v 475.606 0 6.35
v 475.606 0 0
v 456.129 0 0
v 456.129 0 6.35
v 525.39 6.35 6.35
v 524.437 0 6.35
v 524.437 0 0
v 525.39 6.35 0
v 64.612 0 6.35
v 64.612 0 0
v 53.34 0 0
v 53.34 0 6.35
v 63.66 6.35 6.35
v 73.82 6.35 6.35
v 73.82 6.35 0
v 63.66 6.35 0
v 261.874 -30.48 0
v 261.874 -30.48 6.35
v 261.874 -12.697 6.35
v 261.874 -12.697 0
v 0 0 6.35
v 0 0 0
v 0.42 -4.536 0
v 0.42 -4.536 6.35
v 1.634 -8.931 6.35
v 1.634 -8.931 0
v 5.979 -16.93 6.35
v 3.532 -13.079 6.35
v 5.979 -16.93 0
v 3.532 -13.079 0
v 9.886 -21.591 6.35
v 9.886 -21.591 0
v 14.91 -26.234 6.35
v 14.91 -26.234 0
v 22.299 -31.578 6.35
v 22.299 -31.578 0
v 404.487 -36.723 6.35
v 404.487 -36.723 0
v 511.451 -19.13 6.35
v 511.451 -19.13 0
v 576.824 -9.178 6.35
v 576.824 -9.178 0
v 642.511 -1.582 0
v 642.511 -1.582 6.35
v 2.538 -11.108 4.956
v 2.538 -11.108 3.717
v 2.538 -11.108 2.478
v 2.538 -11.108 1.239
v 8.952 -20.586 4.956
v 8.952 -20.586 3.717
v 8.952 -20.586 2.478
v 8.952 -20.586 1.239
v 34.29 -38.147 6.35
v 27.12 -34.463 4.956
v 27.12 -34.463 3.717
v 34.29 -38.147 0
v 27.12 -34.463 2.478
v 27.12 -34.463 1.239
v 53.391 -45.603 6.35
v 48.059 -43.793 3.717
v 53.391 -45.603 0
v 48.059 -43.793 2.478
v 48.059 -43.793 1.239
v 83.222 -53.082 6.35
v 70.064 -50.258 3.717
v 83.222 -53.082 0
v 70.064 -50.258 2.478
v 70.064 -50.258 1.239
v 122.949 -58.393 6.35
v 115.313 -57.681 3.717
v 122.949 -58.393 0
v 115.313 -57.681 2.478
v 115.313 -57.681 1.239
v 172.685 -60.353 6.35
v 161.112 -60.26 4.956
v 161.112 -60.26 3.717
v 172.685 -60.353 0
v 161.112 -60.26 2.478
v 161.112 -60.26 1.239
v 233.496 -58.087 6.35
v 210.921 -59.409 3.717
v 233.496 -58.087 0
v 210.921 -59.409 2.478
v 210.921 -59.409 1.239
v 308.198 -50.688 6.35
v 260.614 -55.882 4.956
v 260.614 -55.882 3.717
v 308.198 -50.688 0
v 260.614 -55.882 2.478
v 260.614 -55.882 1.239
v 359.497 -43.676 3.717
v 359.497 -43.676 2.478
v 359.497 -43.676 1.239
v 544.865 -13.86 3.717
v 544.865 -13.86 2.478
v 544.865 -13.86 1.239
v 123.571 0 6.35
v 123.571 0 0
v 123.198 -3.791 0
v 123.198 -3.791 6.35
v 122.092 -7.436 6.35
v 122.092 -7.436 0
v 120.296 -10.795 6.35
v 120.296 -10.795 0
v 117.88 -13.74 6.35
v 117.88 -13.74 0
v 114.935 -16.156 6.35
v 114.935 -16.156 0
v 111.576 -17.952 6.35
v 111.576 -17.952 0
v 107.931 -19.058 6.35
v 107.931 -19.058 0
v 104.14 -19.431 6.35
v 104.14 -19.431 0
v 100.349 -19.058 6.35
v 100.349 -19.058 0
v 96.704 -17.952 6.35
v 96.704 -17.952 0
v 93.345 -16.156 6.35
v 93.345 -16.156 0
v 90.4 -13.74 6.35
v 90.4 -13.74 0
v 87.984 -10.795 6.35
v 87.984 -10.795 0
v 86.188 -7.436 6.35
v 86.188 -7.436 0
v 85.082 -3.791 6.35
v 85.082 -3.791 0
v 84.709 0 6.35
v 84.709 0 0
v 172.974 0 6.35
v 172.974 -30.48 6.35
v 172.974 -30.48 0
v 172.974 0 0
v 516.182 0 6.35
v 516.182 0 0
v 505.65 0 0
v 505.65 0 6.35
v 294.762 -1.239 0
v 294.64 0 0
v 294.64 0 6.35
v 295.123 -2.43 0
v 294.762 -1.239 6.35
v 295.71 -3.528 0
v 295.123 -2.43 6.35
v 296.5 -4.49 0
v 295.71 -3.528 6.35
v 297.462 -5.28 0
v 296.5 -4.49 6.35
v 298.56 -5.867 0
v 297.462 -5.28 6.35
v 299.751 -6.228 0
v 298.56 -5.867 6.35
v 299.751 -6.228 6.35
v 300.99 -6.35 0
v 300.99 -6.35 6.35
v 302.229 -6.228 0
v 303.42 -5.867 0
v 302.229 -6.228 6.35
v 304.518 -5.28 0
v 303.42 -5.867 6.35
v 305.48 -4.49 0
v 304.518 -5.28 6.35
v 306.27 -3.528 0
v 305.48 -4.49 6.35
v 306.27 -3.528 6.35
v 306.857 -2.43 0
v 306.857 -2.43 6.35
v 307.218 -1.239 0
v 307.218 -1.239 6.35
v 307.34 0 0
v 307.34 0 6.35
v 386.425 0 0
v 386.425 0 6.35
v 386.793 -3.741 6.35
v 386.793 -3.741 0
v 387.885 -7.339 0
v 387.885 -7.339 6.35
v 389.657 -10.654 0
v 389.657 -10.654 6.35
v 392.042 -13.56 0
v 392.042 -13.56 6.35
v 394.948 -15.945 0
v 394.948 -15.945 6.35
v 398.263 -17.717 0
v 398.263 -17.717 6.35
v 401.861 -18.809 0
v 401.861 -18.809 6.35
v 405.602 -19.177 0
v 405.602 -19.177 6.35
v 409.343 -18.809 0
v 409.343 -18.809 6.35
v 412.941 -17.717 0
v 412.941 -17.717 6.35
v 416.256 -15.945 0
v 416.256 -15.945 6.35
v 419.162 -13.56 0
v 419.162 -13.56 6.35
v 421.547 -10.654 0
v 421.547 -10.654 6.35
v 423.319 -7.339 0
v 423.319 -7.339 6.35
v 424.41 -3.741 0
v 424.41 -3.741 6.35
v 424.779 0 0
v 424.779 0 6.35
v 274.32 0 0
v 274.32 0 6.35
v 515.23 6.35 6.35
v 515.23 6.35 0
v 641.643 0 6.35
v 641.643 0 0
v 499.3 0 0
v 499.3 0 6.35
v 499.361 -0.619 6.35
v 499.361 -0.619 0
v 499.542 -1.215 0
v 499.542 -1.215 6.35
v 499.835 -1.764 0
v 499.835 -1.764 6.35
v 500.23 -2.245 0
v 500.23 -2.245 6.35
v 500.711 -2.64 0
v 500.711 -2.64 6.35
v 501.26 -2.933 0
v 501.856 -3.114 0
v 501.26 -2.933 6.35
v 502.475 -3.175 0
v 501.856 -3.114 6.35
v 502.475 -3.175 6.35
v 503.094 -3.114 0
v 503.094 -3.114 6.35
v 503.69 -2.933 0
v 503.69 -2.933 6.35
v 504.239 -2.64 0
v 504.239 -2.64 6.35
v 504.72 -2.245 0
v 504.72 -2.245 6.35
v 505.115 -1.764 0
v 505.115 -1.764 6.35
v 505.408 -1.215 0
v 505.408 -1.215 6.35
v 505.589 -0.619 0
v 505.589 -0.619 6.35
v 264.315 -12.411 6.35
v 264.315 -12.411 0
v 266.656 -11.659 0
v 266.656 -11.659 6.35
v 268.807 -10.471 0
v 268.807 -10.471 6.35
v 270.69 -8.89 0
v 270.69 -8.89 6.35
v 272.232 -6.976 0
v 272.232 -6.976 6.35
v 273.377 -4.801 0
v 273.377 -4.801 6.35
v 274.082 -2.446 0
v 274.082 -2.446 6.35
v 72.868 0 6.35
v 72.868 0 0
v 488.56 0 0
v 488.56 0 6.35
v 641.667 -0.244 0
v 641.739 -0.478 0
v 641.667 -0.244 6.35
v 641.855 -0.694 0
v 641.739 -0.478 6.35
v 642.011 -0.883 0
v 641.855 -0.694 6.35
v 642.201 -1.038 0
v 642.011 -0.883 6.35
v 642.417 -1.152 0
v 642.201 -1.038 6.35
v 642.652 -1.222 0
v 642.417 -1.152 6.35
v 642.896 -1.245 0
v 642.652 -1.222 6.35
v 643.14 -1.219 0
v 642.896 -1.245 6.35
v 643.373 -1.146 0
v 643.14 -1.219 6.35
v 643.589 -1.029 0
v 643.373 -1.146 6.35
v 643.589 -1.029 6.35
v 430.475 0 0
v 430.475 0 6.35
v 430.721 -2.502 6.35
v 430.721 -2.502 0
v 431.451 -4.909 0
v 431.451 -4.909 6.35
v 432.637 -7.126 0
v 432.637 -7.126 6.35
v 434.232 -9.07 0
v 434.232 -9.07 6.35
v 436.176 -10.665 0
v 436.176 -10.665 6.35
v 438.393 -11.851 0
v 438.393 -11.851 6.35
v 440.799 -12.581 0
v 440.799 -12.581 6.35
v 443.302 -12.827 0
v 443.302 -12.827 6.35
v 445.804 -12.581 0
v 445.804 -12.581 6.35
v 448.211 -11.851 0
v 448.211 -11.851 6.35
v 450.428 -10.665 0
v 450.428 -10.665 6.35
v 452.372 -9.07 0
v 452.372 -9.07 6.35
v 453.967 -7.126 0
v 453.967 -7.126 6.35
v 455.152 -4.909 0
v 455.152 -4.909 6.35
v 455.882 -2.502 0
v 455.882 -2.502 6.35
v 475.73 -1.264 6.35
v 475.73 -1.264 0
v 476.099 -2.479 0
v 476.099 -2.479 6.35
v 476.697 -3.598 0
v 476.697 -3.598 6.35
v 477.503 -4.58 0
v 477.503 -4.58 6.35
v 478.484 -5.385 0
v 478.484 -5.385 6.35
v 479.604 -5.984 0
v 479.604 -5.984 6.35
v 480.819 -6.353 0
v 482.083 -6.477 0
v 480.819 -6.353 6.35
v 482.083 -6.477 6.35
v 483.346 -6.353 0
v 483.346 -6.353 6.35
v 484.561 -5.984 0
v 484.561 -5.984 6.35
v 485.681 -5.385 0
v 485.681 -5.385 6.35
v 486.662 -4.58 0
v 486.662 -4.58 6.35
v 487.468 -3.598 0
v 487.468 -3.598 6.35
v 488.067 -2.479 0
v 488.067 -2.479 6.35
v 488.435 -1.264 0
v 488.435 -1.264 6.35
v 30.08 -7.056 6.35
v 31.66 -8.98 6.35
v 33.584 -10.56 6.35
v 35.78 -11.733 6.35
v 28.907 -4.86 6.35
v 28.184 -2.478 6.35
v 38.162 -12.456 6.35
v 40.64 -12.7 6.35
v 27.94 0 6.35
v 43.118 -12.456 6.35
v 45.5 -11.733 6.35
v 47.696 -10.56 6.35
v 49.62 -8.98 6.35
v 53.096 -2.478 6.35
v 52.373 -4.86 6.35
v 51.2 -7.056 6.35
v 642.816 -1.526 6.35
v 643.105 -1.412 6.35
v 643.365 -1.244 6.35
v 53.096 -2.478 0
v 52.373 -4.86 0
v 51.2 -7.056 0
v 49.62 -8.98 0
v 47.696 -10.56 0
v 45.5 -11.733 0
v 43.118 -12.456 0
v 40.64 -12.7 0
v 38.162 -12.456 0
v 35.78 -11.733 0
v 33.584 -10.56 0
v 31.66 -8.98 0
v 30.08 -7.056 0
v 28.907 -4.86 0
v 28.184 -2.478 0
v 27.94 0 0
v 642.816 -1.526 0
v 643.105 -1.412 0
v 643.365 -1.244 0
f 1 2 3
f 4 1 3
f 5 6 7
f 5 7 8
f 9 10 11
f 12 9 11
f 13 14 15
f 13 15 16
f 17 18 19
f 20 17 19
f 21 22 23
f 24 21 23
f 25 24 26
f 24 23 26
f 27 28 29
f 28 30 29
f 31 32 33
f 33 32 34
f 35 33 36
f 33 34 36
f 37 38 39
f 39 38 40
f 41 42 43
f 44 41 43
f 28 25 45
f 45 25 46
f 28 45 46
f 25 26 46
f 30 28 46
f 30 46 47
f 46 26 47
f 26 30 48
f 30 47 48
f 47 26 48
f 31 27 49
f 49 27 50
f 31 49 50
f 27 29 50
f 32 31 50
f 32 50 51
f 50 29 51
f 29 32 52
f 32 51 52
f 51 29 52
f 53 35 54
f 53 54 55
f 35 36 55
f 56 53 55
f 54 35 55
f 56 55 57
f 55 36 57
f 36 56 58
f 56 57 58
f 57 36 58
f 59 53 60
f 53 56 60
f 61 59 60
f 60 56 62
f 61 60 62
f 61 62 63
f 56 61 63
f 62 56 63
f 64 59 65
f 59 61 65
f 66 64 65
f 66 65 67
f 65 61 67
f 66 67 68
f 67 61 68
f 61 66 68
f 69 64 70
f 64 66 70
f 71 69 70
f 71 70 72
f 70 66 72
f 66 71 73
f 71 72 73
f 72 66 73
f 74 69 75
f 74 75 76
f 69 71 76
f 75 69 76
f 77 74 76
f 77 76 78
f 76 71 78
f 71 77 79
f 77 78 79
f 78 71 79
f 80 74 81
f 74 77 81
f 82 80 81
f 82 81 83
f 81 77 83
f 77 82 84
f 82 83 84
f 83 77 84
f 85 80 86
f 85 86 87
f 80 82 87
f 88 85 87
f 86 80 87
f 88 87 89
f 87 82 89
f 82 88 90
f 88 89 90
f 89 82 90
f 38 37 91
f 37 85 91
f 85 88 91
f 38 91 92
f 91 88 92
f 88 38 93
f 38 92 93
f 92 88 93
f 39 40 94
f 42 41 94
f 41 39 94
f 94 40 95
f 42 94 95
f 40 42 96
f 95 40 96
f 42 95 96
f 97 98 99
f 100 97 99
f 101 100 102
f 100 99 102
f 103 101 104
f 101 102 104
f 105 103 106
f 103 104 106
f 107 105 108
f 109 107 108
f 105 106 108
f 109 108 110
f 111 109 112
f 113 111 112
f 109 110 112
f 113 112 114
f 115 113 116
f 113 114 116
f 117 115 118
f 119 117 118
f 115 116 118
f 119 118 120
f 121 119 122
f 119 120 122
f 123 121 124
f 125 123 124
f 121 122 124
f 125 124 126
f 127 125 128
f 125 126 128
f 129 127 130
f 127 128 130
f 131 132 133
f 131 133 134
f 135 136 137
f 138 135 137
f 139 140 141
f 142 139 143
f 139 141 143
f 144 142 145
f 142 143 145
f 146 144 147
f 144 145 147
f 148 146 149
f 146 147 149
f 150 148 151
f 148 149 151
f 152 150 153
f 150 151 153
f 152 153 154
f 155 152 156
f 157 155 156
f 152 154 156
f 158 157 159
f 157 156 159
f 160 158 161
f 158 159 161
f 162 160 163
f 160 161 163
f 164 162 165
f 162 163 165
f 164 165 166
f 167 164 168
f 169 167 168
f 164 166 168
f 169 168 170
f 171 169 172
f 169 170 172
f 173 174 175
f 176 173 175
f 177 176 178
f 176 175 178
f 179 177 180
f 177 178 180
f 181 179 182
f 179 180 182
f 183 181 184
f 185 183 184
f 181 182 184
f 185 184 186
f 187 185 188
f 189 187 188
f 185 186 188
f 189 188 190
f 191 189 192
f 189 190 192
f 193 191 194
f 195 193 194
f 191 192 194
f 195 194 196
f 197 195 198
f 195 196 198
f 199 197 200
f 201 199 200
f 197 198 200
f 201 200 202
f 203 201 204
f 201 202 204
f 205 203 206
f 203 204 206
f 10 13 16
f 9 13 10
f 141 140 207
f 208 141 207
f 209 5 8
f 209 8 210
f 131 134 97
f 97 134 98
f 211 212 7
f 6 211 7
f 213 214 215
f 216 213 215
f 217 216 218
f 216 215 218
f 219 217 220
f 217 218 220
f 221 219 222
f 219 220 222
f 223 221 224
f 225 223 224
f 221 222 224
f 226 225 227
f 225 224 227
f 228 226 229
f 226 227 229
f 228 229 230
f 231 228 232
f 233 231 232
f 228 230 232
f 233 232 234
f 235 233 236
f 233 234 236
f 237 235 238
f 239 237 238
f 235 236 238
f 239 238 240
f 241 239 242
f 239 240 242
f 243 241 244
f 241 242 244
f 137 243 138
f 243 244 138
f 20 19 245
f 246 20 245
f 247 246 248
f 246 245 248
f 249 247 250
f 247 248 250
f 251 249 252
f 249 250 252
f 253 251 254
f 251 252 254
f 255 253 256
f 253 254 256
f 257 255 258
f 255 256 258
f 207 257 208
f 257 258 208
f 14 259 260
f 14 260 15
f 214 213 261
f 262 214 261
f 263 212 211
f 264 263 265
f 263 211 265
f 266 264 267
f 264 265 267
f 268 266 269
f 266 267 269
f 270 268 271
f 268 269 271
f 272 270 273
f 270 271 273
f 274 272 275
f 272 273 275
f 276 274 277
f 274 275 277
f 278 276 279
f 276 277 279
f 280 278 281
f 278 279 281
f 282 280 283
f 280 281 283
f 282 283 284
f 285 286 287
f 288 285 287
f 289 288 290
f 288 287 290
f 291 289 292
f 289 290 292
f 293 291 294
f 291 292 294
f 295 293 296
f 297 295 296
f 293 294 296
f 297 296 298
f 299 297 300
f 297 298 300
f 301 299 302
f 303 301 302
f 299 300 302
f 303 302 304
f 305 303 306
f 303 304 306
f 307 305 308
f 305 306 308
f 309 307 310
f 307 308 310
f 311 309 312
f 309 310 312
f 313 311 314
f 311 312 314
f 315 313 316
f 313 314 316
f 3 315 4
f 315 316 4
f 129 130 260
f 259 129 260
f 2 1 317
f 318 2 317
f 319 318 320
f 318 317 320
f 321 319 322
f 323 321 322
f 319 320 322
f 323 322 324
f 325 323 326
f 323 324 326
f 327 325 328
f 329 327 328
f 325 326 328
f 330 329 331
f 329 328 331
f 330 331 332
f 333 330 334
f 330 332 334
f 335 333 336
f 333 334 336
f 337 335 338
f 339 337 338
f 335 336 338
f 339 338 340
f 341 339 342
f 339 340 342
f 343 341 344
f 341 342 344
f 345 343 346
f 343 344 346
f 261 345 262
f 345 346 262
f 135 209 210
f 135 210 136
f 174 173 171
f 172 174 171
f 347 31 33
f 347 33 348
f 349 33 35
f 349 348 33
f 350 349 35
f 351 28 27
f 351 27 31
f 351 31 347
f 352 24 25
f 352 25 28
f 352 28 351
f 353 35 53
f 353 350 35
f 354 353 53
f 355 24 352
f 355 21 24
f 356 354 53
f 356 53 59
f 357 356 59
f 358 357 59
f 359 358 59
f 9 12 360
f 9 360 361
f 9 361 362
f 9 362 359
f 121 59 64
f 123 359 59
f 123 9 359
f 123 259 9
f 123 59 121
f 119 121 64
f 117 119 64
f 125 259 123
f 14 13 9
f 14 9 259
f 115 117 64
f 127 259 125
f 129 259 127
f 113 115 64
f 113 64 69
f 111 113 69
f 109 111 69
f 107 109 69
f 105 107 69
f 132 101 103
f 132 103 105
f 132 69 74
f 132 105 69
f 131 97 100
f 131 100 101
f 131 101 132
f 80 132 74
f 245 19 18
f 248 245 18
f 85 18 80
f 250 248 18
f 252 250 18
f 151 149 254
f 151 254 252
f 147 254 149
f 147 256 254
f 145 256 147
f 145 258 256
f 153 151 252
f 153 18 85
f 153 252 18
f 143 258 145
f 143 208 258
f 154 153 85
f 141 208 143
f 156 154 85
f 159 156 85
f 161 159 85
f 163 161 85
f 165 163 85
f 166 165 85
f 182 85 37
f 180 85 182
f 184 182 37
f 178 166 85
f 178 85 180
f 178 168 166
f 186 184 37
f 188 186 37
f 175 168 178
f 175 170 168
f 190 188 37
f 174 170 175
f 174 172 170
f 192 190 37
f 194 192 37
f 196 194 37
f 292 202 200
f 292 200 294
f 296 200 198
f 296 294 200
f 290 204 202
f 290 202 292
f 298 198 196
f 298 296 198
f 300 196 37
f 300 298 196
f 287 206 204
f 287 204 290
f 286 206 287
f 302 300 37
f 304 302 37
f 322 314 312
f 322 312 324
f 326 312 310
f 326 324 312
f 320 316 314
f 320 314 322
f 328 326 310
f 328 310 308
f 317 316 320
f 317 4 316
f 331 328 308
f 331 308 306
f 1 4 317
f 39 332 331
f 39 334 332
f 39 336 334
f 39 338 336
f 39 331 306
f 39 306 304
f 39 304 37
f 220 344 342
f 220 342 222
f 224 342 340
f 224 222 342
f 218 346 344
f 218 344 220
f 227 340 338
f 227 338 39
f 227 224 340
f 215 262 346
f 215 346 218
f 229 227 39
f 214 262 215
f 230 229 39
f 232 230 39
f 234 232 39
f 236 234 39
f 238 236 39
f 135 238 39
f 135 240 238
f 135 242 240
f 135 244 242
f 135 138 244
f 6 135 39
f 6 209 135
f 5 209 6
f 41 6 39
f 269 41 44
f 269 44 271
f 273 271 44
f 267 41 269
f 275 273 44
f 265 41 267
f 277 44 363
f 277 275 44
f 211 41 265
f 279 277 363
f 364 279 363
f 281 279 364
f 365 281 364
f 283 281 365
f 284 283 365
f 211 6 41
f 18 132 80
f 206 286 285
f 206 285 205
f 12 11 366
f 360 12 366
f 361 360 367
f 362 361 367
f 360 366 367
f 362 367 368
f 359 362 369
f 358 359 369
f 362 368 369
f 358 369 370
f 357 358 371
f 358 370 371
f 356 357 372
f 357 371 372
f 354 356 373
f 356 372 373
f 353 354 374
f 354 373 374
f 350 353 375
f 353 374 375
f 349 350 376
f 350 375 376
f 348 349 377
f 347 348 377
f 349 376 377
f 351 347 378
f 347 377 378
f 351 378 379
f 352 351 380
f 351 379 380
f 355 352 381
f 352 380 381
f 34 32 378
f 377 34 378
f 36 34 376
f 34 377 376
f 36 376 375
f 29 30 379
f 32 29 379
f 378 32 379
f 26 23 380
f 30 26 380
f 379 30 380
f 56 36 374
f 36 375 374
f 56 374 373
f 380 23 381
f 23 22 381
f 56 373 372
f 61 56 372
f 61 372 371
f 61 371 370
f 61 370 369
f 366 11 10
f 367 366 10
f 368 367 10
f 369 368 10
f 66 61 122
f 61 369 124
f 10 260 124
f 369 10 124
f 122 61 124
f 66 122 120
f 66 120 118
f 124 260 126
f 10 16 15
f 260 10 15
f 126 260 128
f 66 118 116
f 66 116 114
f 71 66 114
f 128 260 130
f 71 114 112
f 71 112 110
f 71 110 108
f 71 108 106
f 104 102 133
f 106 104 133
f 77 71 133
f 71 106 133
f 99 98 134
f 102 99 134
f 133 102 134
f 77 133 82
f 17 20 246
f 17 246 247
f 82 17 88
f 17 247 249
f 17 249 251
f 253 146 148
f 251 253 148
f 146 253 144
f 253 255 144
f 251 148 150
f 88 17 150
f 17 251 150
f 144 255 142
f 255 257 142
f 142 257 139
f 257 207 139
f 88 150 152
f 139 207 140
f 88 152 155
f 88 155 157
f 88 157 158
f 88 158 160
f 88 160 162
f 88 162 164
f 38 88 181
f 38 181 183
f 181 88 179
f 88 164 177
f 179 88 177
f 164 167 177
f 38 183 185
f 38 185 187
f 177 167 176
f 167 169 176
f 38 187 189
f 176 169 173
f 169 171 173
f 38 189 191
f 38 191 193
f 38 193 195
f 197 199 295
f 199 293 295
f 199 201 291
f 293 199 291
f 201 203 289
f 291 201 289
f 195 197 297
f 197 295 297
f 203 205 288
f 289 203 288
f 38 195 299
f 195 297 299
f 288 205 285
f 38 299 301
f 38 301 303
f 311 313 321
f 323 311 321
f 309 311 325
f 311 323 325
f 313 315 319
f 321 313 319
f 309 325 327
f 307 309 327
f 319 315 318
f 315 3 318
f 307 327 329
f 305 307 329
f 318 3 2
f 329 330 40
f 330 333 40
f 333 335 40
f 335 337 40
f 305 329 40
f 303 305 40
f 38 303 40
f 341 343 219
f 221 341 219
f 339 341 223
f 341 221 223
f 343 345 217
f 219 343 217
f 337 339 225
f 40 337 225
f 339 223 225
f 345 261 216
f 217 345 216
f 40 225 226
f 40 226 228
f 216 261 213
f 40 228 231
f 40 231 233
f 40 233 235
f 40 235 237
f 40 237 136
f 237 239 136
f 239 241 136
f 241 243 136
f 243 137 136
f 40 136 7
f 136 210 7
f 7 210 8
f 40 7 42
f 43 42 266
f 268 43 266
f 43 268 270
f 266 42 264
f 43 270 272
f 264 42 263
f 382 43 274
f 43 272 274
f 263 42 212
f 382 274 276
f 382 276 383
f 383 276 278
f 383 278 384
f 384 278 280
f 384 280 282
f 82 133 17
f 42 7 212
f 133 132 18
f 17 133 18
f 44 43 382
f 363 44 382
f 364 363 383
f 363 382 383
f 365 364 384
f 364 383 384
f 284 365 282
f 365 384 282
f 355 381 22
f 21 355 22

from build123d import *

# Parameters (mm, degrees)
BOSS_EXTRUDE1_DEPTH     = 6.35
CUT_EXTRUDE2_DEPTH      = 1.0000001
CUT_EXTRUDE2_DEPTH_BACK = 7.3500001
SKETCH4_W               = 6.35
SKETCH4_H               = 6.35
BOSS_EXTRUDE2_DEPTH     = 6.35
SKETCH7_W               = 88.9
SKETCH7_H               = 60.96
CUT_EXTRUDE4_DEPTH      = 7.3500001
SKETCH8_R               = 1.2446
CUT_EXTRUDE5_DEPTH      = 7.3500001


with BuildPart() as part:
    # Sketch2 → Boss-Extrude1 (new body)
    with BuildSketch(Plane.XY):
        with BuildLine():
            Line((460.660965279, 0), (123.571, 0))
            ThreePointArc((123.571, 0), (104.14, -19.431), (84.709, 0))
            Line((84.709, 0), (53.34, 0))
            ThreePointArc((53.34, 0), (40.64, -12.7), (27.94, 0))
            Line((27.94, 0), (0, 0))
            add(Edge.make_bspline(
                [(0, 0), (0, -1.007496172), (0.154611582, -3.513796615), (1.106333228, -7.923389435), (3.463136343, -13.420354421), (7.689616489, -19.513207632), (13.932423524, -25.726412106), (22.129107375, -31.731455339), (32.141645239, -37.332204029), (43.82045433, -42.41500246), (57.023709725, -46.912543066), (71.619696083, -50.784752003), (87.485018636, -54.008935199), (104.502313427, -56.574303932), (122.558104573, -58.481758104), (141.542033828, -59.739895824), (161.345829027, -60.366961324), (181.863132616, -60.387506142), (202.989192599, -59.8341217), (224.620860897, -58.745176641), (246.65655865, -57.164603829), (268.996310773, -55.141201012), (291.541767704, -52.727712704), (314.196207315, -49.979843895), (336.86454415, -46.955447457), (359.453314895, -43.713502532), (381.870662856, -40.313266856), (404.02631566, -36.813220545), (425.831595832, -33.270324121), (447.199424328, -29.739007432), (468.044367735, -26.27043606), (488.282710288, -22.911672601), (507.832591566, -19.705111663), (526.614143658, -16.687720753), (544.549749946, -13.890665375), (561.564270734, -11.338919625), (577.585454095, -9.050636147), (592.543922516, -7.037634907), (606.374988512, -5.304428983), (619.014124193, -3.849253664), (630.413817462, -2.663385493), (638.093728429, -1.953546407), (641.993392355, -1.625070631), (642.510849283, -1.582039112)],
                knots=[0.5, 0.5, 0.5, 0.5, 0.502166769, 0.505390167, 0.509655974, 0.514947682, 0.521244711, 0.528520886, 0.536744945, 0.54588136, 0.555890751, 0.566730119, 0.57835299, 0.590709588, 0.603747039, 0.617409572, 0.631638768, 0.646373793, 0.661551658, 0.677107483, 0.692974771, 0.709085713, 0.725371443, 0.741762353, 0.758188398, 0.774579367, 0.790865214, 0.806976332, 0.822843867, 0.838400002, 0.853578262, 0.868313774, 0.882543568, 0.896206835, 0.909245173, 0.92160287, 0.933227116, 0.944068236, 0.954079898, 0.963219316, 0.971447445, 0.978729112, 0.979842958, 0.979842958, 0.979842958, 0.979842958], degree=3))
            ThreePointArc((642.510849283, -1.582039112), (643.547407924, -1.075012082), (643.966787522, 0))
            Line((643.966787522, 0), (473.360965279, 0))
            Line((473.360965279, 0), (460.660965279, 0))
        make_face()
    extrude(amount=BOSS_EXTRUDE1_DEPTH)

    # Sketch3 → Cut-Extrude2 (cut, two sides)
    with BuildSketch(Plane.XY.offset(6.35)) as cut_extrude2_sk:
        with BuildLine():
            ThreePointArc((424.77879385, 0), (405.60179385, 19.177), (386.42479385, 0))
            Line((386.42479385, 0), (424.77879385, 0))
        make_face()
        with BuildLine():
            Line((424.77879385, 0), (386.42479385, 0))
            ThreePointArc((386.42479385, 0), (405.60179385, -19.177), (424.77879385, 0))
        make_face()
        with BuildLine():
            ThreePointArc((430.474866123, 0), (443.301866123, -12.827), (456.128866123, 0))
            Line((456.128866123, 0), (430.474866123, 0))
        make_face()
        with BuildLine():
            Line((430.474866123, 0), (456.128866123, 0))
            ThreePointArc((456.128866123, 0), (443.301866123, 12.827), (430.474866123, 0))
        make_face()
        with BuildLine():
            ThreePointArc((475.605534569, 0), (482.082534569, -6.477), (488.559534569, 0))
            Line((488.559534569, 0), (475.605534569, 0))
        make_face()
        with BuildLine():
            Line((475.605534569, 0), (488.559534569, 0))
            ThreePointArc((488.559534569, 0), (482.082534569, 6.477), (475.605534569, 0))
        make_face()
        with BuildLine():
            ThreePointArc((499.299992417, 0), (502.474992417, -3.175), (505.649992417, 0))
            Line((505.649992417, 0), (499.299992417, 0))
        make_face()
        with BuildLine():
            Line((499.299992417, 0), (505.649992417, 0))
            ThreePointArc((505.649992417, 0), (502.474992417, 3.175), (499.299992417, 0))
        make_face()
        with BuildLine():
            ThreePointArc((274.32, 0), (261.62, 12.7), (248.92, 0))
            Line((248.92, 0), (274.32, 0))
        make_face()
        with BuildLine():
            Line((274.32, 0), (248.92, 0))
            ThreePointArc((248.92, 0), (261.62, -12.7), (274.32, 0))
        make_face()
        with BuildLine():
            ThreePointArc((294.64, 0), (300.99, -6.35), (307.34, 0))
            Line((307.34, 0), (294.64, 0))
        make_face()
        with BuildLine():
            Line((294.64, 0), (307.34, 0))
            ThreePointArc((307.34, 0), (300.99, 6.35), (294.64, 0))
        make_face()
    extrude(amount=CUT_EXTRUDE2_DEPTH, mode=Mode.SUBTRACT)
    extrude(cut_extrude2_sk.sketch, amount=-CUT_EXTRUDE2_DEPTH_BACK, mode=Mode.SUBTRACT)

    # Sketch4 → Boss-Extrude2 (add)
    with BuildSketch(Plane.XY.offset(6.35)):
        Polygon((516.182034569, 0), (517.134534569, 0), (517.134534569, 6.35), (515.229534569, 6.35), align=None)
        with Locations((520.309534569, 3.175)):
            Rectangle(SKETCH4_W, SKETCH4_H)
        Polygon((523.484534569, 0), (524.437034569, 0), (525.389534569, 6.35), (523.484534569, 6.35), align=None)
        Polygon((65.565, 6.35), (63.66, 6.35), (64.6125, 0), (65.565, 0), align=None)
        with Locations((68.74, 3.175)):
            Rectangle(SKETCH4_W, SKETCH4_H)
        Polygon((73.82, 6.35), (71.915, 6.35), (71.915, 0), (72.8675, 0), align=None)
    extrude(amount=-BOSS_EXTRUDE2_DEPTH)

    # Sketch7 → Cut-Extrude4 (cut, through all)
    with BuildSketch(Plane(origin=(327.95923074, -13.751410445, 6.35), x_dir=(1, 0, 0), z_dir=(0, 0, 1))):
        with Locations((-110.53523074, 13.751410445)):
            Rectangle(SKETCH7_W, SKETCH7_H)
    extrude(amount=-CUT_EXTRUDE4_DEPTH, mode=Mode.SUBTRACT)

    # Sketch8 → Cut-Extrude5 (cut, through all)
    with BuildSketch(Plane(origin=(327.95923074, -13.751410445, 6.35), x_dir=(1, 0, 0), z_dir=(0, 0, 1))):
        with Locations((314.928477568, 13.751410445)):
            Circle(SKETCH8_R)
    extrude(amount=-CUT_EXTRUDE5_DEPTH, mode=Mode.SUBTRACT)


solid = part.part
